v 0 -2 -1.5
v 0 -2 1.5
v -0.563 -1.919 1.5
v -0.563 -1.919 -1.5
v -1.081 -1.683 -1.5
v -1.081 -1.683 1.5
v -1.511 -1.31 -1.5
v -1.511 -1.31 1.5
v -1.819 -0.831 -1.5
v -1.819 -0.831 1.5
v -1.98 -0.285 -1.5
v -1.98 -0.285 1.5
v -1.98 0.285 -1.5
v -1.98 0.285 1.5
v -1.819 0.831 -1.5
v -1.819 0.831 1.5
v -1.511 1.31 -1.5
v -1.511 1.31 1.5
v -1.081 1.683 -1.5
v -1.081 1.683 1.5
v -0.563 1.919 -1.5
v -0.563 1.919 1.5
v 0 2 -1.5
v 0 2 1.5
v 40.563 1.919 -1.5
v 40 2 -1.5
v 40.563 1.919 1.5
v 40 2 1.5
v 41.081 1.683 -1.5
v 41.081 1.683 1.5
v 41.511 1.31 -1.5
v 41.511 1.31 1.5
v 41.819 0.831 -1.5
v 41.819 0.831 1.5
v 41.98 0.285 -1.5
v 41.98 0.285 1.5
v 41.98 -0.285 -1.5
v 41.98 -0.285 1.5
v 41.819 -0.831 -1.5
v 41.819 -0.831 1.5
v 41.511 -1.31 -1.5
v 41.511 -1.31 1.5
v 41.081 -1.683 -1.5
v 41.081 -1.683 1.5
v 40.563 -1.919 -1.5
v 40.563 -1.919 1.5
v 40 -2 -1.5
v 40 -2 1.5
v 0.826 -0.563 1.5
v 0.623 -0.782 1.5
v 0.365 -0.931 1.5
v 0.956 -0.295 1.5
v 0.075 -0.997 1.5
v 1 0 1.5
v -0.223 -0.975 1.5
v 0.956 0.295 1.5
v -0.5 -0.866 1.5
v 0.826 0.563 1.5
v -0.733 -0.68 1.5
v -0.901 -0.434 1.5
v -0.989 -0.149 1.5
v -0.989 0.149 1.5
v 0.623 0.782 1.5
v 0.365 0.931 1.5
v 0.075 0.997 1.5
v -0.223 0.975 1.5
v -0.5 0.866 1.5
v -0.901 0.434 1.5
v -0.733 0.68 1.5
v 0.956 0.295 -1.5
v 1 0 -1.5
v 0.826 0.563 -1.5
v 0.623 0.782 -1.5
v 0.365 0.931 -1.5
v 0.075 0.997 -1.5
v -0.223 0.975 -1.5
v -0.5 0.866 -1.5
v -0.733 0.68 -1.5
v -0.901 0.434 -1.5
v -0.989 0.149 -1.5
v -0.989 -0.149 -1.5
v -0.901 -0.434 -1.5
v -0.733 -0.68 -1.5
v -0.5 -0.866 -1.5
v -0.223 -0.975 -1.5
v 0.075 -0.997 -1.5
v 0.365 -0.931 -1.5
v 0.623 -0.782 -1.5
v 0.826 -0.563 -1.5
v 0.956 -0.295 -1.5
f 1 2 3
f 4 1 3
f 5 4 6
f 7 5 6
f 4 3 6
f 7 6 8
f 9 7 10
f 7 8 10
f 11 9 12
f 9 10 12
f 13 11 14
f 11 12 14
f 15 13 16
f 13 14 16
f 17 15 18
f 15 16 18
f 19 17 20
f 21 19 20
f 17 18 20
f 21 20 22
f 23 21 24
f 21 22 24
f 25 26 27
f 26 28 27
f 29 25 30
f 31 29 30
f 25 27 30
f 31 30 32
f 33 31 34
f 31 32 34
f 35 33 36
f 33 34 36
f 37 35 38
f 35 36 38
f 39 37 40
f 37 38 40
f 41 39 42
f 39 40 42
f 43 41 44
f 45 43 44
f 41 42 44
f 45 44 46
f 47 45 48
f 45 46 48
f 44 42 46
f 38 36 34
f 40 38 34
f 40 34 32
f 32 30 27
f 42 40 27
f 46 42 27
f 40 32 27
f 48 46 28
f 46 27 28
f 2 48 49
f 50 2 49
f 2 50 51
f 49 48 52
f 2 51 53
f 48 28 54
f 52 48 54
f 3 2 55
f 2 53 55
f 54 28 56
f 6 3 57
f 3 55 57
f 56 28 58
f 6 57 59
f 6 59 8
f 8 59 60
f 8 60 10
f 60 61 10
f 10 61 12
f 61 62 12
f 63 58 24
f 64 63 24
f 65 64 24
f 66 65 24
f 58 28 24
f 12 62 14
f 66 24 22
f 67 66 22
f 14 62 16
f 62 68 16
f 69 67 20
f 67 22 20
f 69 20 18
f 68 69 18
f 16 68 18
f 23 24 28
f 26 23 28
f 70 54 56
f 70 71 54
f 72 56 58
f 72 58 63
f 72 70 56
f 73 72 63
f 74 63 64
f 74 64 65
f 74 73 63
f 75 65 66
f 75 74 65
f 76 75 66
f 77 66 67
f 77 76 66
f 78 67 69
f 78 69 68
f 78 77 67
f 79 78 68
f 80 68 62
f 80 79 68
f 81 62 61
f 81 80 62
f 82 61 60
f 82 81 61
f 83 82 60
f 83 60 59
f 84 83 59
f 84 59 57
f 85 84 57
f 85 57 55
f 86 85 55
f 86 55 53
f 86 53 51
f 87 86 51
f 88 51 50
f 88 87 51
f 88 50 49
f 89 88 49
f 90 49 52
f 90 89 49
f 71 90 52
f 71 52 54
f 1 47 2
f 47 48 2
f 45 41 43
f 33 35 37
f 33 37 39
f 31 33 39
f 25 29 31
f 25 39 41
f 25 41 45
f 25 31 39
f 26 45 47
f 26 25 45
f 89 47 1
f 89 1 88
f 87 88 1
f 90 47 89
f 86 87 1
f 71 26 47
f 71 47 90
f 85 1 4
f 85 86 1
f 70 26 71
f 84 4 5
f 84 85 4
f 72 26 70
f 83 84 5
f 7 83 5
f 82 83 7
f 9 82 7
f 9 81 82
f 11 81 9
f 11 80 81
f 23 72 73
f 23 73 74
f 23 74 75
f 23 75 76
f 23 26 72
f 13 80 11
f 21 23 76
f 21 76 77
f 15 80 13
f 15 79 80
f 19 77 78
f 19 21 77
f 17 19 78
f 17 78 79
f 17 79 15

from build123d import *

# Parameters (mm, degrees)
SKETCH_1_R      = 1
EXTRUDE_1_DEPTH = 1.5


with BuildPart() as part:
    # 草图1 → 凸台-拉伸1 (new, symmetric)
    with BuildSketch(Plane.XY):
        with BuildLine():
            Line((0, 2), (40, 2))
            ThreePointArc((40, 2), (42, 0), (40, -2))
            Line((40, -2), (0, -2))
            ThreePointArc((0, -2), (-2, 0), (0, 2))
        make_face()
        Circle(SKETCH_1_R, mode=Mode.SUBTRACT)
    extrude(amount=EXTRUDE_1_DEPTH, both=True)


solid = part.part
